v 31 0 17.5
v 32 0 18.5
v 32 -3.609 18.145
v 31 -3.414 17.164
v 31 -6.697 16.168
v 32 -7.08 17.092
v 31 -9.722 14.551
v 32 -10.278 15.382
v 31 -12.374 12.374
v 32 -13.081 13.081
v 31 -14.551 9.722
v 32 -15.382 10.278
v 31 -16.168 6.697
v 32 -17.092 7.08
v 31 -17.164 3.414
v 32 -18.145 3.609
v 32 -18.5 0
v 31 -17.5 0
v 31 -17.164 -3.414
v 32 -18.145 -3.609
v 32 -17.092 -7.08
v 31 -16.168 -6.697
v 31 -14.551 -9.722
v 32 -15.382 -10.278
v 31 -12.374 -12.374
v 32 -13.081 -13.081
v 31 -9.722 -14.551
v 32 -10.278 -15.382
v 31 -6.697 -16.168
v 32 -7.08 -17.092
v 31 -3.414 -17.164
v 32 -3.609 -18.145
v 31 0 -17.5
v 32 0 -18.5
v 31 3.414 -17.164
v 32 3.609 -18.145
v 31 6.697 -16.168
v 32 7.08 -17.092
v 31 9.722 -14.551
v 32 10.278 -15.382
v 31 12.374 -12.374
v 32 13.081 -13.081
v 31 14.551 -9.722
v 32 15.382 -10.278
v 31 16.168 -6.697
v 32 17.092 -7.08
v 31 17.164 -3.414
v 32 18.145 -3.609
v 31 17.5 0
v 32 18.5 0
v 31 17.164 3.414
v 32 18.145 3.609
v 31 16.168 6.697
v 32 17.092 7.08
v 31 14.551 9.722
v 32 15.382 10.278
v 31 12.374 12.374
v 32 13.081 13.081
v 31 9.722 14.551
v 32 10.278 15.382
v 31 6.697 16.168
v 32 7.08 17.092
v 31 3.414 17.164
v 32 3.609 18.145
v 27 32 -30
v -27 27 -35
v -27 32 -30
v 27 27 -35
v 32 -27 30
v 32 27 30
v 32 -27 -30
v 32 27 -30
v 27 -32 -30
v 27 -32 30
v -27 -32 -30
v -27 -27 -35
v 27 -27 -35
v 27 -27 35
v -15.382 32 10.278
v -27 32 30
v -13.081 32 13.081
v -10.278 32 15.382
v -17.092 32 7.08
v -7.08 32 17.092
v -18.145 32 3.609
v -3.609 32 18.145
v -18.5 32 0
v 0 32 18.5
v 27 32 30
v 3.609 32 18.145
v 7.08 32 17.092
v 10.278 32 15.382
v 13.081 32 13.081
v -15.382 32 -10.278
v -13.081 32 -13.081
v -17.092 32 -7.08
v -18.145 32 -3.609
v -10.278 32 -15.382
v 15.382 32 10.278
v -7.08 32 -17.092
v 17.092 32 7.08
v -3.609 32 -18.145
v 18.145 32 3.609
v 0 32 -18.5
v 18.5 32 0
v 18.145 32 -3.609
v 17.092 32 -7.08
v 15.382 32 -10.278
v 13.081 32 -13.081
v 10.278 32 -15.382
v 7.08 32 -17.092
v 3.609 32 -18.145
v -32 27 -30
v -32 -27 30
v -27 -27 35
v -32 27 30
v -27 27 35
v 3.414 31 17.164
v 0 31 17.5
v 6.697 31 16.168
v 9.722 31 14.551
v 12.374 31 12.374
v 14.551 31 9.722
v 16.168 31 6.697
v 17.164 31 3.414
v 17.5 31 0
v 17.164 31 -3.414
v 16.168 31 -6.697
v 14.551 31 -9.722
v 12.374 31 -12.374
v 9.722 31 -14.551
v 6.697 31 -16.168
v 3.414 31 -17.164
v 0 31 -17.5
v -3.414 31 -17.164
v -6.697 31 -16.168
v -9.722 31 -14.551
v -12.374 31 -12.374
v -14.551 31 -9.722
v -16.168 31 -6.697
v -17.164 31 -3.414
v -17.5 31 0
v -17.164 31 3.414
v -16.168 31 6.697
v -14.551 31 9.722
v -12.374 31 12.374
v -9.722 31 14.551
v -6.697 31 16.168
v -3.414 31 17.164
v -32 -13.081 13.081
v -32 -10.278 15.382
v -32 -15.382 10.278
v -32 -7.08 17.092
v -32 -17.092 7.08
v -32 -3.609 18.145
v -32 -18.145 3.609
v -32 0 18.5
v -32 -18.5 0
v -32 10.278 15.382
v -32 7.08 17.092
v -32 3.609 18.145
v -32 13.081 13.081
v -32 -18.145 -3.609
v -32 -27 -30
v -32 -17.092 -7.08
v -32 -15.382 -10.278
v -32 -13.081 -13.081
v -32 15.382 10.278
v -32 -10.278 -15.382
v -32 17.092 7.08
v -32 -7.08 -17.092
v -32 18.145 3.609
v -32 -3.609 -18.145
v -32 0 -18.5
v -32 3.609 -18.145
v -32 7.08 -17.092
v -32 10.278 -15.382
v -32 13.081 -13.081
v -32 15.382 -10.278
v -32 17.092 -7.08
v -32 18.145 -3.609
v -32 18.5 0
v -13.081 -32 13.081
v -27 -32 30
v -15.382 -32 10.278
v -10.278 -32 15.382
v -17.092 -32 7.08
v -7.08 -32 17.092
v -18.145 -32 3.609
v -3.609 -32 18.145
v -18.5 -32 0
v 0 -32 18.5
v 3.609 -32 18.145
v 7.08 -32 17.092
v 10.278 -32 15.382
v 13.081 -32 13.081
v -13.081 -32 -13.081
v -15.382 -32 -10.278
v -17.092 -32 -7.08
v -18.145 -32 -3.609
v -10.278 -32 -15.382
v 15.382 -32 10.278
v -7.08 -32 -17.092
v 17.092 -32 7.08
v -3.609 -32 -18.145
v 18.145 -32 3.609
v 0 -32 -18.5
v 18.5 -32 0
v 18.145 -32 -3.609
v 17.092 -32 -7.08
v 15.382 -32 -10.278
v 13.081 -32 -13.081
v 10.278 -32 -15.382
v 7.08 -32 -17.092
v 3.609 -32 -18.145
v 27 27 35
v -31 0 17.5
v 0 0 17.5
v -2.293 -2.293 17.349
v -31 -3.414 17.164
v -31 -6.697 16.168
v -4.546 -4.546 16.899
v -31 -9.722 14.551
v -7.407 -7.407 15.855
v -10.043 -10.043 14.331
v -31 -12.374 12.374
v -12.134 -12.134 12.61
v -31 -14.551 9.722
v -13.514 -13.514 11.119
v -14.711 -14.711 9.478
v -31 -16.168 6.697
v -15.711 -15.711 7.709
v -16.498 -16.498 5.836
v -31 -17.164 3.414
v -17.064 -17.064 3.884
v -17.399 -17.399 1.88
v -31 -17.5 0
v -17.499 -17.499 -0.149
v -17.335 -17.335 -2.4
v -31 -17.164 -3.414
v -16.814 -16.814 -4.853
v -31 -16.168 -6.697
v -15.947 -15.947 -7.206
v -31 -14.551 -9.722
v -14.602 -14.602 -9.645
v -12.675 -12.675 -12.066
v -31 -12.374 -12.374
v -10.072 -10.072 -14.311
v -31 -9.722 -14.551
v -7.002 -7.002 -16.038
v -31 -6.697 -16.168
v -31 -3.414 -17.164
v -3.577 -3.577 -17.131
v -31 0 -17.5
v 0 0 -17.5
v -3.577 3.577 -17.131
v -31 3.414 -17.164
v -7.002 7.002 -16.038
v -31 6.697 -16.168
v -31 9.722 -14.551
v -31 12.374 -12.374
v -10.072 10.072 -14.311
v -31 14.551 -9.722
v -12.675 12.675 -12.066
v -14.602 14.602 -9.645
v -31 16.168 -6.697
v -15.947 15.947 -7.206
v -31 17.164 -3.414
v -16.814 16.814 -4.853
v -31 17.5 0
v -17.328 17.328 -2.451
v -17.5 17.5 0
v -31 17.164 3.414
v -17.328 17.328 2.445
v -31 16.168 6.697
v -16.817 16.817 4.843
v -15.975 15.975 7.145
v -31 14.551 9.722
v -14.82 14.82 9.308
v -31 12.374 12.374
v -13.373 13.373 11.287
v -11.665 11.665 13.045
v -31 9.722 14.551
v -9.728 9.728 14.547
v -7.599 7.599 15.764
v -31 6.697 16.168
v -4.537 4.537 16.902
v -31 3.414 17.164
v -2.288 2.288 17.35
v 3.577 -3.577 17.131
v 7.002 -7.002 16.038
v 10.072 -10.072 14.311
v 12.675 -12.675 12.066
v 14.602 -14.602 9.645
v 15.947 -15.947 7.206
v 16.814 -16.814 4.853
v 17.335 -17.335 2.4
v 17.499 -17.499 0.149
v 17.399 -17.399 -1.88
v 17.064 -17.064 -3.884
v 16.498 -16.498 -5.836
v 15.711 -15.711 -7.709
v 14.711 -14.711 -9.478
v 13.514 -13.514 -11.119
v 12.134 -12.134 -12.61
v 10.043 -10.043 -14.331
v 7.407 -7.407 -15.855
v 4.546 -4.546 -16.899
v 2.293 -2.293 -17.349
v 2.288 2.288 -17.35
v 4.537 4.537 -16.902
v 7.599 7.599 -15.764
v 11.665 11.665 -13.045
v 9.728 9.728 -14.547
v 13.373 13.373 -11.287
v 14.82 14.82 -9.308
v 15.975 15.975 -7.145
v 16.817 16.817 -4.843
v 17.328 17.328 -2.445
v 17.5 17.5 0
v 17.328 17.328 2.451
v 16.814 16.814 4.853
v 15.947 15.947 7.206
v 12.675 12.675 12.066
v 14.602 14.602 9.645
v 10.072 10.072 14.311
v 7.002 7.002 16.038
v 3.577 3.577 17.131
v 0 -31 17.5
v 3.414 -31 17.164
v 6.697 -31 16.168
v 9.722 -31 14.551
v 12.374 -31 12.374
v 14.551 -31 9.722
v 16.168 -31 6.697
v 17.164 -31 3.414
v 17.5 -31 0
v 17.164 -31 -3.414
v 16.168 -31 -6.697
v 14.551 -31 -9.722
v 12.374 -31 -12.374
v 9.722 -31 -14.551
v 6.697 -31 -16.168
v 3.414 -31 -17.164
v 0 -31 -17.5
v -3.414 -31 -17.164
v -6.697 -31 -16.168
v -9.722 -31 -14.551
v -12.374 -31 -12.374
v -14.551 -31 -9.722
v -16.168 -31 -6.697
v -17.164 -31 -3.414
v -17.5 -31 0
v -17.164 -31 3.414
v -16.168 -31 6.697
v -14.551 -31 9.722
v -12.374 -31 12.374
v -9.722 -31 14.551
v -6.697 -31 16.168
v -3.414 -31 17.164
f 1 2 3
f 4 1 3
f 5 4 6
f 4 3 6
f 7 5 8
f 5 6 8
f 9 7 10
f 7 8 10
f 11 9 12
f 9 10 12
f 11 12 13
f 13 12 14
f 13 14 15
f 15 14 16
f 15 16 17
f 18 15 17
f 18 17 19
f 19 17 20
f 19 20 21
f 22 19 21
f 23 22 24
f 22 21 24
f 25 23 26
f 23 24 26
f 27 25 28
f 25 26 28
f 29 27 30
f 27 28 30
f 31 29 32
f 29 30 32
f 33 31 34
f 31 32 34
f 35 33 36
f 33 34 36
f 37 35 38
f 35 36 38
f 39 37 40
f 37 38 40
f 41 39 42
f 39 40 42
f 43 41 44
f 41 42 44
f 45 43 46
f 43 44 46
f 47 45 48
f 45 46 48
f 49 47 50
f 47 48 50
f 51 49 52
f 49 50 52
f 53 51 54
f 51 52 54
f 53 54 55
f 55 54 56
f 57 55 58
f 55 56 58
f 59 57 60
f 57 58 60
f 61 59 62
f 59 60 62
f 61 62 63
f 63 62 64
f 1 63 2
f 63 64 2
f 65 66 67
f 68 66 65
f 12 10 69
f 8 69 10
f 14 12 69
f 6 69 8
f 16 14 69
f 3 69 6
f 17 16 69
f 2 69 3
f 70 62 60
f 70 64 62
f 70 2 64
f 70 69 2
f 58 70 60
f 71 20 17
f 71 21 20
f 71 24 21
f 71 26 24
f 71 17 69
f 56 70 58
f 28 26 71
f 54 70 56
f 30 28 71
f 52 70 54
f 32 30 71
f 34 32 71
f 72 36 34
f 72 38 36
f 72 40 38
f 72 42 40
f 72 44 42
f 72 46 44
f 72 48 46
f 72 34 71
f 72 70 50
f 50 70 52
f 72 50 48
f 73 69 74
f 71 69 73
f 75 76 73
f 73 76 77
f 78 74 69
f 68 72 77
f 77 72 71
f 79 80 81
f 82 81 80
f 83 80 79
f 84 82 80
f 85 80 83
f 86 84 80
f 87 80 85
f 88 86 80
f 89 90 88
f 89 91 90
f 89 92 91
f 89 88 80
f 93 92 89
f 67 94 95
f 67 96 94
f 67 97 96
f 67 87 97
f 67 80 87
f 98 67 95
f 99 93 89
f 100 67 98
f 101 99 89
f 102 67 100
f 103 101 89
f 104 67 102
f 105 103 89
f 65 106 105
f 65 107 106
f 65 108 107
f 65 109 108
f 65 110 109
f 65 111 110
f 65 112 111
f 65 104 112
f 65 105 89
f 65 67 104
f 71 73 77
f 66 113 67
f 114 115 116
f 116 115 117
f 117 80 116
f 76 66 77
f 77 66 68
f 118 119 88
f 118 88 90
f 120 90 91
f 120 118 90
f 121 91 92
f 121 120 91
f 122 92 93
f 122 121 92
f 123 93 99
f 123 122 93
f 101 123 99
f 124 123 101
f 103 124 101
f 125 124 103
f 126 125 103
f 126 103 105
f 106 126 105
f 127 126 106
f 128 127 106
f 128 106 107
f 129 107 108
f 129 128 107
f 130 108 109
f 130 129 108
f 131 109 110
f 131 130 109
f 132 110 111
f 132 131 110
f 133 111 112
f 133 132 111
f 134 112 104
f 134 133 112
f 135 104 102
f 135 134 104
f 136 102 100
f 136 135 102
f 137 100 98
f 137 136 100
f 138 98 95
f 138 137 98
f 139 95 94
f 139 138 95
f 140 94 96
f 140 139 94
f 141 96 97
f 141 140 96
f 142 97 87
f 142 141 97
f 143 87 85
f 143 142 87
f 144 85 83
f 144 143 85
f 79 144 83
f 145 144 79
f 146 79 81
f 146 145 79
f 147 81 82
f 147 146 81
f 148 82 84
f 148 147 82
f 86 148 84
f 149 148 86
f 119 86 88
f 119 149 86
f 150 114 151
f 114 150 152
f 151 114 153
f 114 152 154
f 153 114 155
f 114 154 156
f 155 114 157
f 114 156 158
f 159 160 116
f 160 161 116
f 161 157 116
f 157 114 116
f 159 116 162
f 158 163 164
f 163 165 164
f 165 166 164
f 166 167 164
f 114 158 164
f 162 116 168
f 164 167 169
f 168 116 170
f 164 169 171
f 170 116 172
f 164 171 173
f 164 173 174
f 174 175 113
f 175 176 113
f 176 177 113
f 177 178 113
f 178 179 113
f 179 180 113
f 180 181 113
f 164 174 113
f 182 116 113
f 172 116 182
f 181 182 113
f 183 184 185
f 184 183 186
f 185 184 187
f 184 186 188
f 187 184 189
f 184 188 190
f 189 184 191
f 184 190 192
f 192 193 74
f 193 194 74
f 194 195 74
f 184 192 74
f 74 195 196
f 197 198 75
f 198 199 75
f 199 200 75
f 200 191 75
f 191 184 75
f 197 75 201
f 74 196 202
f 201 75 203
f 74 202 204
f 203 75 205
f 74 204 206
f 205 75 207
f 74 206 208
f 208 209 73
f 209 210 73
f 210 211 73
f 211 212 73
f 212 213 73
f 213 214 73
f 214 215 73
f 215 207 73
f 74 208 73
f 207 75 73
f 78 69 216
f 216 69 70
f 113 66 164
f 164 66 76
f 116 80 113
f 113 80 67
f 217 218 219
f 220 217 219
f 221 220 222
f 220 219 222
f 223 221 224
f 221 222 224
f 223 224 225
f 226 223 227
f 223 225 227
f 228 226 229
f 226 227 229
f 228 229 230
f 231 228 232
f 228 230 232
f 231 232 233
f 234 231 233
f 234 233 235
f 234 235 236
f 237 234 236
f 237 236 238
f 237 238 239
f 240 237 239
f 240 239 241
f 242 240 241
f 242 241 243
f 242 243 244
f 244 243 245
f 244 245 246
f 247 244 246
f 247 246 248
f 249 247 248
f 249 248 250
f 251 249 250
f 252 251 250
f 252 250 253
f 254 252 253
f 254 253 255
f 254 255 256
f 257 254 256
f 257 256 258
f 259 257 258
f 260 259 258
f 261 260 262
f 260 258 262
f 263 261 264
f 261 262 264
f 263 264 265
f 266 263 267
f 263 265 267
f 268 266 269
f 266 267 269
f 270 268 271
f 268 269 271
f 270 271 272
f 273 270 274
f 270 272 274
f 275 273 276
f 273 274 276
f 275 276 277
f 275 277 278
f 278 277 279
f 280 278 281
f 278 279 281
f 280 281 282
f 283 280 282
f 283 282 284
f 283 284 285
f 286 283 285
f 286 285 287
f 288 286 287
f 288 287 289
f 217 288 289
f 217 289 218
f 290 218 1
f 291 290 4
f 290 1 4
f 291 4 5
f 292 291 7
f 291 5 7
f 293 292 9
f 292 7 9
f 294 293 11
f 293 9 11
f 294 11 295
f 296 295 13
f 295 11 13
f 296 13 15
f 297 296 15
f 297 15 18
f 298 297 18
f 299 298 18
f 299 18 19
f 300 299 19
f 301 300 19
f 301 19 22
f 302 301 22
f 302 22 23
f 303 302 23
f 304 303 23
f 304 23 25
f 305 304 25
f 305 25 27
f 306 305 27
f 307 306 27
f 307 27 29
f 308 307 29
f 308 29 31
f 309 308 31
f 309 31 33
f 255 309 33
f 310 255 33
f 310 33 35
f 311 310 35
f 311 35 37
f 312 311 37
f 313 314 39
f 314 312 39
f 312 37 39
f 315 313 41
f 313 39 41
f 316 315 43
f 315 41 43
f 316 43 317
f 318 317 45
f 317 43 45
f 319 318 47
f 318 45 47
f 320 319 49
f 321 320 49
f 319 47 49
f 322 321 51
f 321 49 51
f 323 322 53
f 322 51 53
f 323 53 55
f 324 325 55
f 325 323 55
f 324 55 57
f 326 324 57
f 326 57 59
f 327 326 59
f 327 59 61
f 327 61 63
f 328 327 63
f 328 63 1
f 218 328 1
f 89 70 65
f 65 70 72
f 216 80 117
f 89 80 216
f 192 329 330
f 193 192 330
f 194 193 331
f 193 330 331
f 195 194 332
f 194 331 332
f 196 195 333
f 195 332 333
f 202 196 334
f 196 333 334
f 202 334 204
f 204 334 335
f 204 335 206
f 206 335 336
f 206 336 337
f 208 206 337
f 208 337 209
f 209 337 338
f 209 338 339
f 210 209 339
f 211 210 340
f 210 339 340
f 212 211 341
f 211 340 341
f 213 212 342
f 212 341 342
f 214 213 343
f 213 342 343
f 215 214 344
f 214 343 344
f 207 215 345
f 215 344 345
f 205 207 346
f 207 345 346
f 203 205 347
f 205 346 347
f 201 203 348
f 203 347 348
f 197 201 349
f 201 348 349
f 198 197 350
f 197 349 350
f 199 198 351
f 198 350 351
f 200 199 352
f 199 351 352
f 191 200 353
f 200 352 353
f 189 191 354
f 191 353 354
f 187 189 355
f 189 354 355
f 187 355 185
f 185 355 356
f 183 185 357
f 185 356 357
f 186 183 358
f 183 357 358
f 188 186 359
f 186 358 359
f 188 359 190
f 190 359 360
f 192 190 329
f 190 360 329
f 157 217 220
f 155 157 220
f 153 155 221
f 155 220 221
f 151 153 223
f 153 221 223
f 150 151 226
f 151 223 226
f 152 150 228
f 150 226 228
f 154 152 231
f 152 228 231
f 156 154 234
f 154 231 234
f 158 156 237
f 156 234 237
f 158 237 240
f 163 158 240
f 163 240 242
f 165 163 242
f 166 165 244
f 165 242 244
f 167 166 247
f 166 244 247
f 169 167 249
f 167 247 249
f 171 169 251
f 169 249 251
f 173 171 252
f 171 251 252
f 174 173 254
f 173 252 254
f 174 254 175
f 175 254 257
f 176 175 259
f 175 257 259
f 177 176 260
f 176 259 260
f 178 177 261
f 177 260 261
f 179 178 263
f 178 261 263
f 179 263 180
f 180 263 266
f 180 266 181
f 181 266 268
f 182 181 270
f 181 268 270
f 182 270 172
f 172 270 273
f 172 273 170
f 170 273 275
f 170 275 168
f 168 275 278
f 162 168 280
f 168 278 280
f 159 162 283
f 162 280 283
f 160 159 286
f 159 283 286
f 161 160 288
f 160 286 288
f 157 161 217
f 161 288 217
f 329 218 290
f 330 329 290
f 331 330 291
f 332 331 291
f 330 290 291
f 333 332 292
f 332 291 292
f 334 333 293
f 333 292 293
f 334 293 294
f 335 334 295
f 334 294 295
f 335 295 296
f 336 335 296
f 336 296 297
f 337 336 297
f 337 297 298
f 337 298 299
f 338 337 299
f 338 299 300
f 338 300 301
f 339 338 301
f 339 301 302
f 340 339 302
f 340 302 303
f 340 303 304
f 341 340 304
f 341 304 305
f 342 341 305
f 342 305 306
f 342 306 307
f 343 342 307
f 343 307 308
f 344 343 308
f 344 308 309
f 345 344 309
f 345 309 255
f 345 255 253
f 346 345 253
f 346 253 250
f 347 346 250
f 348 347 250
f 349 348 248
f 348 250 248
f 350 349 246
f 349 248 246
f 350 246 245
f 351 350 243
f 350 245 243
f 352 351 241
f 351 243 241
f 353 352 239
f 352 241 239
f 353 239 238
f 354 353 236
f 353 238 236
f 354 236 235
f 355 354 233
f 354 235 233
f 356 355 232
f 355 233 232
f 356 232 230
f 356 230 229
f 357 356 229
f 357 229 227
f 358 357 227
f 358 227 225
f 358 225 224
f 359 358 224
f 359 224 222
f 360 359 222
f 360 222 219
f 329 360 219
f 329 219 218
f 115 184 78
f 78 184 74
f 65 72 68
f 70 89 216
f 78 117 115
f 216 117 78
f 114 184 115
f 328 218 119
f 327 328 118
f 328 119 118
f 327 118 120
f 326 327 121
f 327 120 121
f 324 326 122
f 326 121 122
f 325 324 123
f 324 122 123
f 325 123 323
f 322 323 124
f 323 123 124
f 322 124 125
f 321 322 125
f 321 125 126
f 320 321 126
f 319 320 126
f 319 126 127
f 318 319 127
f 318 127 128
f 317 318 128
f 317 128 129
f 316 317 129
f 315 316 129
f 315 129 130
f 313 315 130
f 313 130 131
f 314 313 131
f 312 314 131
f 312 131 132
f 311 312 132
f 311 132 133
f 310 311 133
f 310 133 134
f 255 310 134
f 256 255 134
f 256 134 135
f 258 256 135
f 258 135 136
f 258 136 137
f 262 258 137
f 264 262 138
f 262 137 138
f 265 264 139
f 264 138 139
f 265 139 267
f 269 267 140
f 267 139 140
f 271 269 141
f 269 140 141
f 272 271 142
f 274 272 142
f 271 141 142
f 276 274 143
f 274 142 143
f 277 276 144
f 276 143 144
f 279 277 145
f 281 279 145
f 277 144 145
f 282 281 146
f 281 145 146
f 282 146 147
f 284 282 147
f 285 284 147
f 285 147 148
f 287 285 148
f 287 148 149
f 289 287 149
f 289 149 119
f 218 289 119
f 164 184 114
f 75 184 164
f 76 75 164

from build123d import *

# Parameters (mm, degrees)
SKETCH1_W           = 64
SKETCH1_H           = 70
BOSS_EXTRUDE1_DEPTH = 32
SKETCH2_R           = 17.5
CUT_EXTRUDE1_DEPTH  = 80.655508284
CIRPATTERN4_COUNT   = 4
CHAMFER1_SIZE       = 5
CHAMFER2_SIZE       = 1


with BuildPart() as part:
    # Sketch1 → Boss-Extrude1 (new, symmetric)
    with BuildSketch(Plane(origin=(0, 0, 0), x_dir=(1, 0, 0), z_dir=(0, 1, 0))):
        Rectangle(SKETCH1_W, SKETCH1_H)
    extrude(amount=BOSS_EXTRUDE1_DEPTH, both=True)

    # Sketch2 → Cut-Extrude1 (cut, through all)
    with BuildSketch(Plane(origin=(0, 32, 0), x_dir=(1, 0, 0), z_dir=(0, 1, 0))):
        Circle(SKETCH2_R)
    cut_extrude1 = extrude(amount=-CUT_EXTRUDE1_DEPTH, mode=Mode.SUBTRACT)

    # CirPattern4: Cut-Extrude1 ×4 about axis
    cirpattern4_axis = Axis((0, 0, 38.5), (0, 0, -1))
    for i in range(1, CIRPATTERN4_COUNT):
        add(cut_extrude1.rotate(cirpattern4_axis, i * 360 / CIRPATTERN4_COUNT), mode=Mode.SUBTRACT)

    # Chamfer1
    chamfer1_edges = [part.edges().sort_by_distance(p)[0] for p in [
        (0, -32, 35),
        (32, 0, 35),
        (-32, 0, 35),
        (-32, -32, 0),
        (-32, 0, -35),
        (0, -32, -35),
        (0, 32, 35),
        (-32, 32, 0),
        (32, -32, 0),
        (32, 0, -35),
        (0, 32, -35),
        (32, 32, 0),
    ]]
    chamfer(chamfer1_edges, length=CHAMFER1_SIZE)

    # Chamfer2
    chamfer2_edges = [part.edges().sort_by_distance(p)[0] for p in [
        (-17.5, -32, 0),
        (32, 17.5, 0),
        (-17.5, 32, 0),
        (-32, 17.5, 0),
    ]]
    chamfer(chamfer2_edges, length=CHAMFER2_SIZE)


solid = part.part
